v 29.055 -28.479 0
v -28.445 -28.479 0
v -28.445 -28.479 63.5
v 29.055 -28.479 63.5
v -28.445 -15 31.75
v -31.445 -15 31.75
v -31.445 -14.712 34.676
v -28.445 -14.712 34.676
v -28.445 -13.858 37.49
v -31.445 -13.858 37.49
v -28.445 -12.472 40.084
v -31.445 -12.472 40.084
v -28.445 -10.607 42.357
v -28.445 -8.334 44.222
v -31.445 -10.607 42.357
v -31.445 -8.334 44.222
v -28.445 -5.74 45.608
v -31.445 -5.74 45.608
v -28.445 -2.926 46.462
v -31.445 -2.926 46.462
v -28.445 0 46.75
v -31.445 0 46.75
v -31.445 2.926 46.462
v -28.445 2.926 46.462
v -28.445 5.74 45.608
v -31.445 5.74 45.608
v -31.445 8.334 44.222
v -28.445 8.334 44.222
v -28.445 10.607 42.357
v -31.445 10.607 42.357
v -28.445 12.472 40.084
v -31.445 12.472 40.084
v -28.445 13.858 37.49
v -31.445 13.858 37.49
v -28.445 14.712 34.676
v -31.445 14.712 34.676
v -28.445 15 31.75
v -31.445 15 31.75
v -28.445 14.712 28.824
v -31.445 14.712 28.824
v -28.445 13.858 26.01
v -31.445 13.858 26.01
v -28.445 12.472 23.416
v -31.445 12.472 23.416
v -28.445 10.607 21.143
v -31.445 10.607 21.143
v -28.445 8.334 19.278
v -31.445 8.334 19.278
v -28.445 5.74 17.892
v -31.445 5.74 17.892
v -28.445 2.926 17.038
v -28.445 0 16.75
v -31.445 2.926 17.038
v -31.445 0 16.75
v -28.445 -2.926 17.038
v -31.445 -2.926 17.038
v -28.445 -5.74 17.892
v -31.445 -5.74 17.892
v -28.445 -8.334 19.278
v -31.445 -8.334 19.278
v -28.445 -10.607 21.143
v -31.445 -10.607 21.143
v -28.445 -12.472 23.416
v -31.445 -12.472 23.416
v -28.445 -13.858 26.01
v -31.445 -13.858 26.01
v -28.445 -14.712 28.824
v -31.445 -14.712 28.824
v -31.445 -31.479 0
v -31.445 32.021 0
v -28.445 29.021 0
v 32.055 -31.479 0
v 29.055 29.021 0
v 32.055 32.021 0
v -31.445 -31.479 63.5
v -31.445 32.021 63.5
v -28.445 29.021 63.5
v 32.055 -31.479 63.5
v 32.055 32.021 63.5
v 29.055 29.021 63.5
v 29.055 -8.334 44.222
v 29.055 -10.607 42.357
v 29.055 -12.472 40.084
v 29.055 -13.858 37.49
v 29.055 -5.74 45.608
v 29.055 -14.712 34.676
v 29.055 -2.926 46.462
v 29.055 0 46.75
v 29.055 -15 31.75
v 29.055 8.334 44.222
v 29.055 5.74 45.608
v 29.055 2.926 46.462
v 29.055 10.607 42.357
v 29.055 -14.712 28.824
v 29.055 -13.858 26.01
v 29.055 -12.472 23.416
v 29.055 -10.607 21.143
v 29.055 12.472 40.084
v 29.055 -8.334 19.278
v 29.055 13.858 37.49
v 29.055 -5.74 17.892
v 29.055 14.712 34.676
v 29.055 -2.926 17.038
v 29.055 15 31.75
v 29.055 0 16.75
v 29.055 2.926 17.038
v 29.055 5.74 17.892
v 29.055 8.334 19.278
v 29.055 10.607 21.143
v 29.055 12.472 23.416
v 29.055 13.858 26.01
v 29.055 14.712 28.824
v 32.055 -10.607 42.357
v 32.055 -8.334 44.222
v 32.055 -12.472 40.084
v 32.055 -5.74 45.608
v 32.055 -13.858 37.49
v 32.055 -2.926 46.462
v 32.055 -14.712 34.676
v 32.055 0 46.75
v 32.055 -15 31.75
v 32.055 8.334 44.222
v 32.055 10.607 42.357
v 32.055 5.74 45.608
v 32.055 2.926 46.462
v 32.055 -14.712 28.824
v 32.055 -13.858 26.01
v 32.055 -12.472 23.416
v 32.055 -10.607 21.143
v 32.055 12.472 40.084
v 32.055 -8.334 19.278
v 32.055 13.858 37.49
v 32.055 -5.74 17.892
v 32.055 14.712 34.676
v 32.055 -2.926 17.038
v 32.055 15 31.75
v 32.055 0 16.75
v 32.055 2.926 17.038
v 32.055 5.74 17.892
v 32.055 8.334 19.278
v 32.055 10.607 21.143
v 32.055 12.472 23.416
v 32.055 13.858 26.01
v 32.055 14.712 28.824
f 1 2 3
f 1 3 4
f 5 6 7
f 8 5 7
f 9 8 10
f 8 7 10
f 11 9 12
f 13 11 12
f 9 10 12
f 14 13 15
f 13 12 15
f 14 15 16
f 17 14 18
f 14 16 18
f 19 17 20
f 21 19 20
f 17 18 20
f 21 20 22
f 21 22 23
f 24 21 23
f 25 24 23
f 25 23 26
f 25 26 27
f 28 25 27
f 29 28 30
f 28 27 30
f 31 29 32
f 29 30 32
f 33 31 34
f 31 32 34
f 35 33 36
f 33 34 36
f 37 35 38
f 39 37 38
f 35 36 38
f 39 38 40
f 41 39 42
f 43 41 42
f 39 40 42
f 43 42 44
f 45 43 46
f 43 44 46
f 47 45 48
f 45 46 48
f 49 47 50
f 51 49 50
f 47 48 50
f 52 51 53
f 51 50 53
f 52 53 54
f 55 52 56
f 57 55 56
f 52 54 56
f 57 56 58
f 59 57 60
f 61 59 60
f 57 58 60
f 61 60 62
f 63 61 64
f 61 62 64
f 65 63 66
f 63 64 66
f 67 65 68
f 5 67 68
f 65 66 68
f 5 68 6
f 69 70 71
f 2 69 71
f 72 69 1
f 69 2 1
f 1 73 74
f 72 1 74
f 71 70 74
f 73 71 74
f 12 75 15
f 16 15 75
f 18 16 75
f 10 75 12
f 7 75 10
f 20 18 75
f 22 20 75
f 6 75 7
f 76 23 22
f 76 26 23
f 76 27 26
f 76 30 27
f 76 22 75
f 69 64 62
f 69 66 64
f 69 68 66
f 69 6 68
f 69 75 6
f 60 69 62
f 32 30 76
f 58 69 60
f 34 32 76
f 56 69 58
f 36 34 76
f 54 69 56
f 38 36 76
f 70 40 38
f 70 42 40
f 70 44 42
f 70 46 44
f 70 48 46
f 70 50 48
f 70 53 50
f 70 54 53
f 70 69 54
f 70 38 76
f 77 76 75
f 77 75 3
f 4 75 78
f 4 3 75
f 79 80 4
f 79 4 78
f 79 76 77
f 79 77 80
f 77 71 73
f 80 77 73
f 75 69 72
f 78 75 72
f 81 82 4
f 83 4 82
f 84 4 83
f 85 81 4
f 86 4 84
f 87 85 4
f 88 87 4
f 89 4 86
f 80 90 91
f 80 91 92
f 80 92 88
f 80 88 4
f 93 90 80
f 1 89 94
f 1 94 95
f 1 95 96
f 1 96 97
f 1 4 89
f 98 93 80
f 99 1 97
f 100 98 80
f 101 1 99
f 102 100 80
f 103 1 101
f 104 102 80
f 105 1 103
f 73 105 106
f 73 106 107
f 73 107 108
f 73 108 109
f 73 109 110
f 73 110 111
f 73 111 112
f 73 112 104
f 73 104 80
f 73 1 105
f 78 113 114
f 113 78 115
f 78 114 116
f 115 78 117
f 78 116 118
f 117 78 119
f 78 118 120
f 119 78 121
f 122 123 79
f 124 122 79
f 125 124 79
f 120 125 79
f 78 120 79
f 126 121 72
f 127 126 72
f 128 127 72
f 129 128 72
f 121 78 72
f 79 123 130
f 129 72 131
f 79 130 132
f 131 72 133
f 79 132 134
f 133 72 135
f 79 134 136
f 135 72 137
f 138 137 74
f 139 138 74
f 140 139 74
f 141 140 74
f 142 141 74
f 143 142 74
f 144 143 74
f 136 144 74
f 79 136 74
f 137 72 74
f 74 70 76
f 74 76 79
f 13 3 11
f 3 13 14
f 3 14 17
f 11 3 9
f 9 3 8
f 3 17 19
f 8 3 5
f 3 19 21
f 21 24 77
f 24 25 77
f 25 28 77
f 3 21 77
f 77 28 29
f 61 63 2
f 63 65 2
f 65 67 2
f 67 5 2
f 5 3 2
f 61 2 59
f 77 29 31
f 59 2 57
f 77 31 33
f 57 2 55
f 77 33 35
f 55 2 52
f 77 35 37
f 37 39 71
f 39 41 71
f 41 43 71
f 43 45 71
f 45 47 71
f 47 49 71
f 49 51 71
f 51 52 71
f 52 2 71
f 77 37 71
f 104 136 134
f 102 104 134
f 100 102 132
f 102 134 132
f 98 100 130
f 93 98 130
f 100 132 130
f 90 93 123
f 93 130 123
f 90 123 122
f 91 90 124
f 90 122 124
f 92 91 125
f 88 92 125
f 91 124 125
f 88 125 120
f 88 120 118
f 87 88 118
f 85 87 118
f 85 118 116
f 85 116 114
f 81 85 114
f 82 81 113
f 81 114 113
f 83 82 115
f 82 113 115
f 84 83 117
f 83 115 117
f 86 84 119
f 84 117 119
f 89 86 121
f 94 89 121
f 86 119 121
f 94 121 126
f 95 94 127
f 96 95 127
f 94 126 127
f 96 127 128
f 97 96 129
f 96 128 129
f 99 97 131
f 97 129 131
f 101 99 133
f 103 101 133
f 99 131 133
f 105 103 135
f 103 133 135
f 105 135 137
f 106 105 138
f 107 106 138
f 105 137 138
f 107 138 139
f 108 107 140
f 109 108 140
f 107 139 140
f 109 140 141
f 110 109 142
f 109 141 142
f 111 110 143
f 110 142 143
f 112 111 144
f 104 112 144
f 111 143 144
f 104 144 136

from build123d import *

# Parameters (mm, degrees)
F0_W     = 63.5
F0_H     = 63.5
F0_W_2   = 57.5
F0_H_2   = 57.5
F1_DEPTH = 63.5
F2_R     = 15
F3_DEPTH = 3
F4_R     = 15
F5_DEPTH = 3


with BuildPart() as f1:
    # F0 (on Top) → F1 (new body)
    with BuildSketch(Plane.XY):
        with Locations((0.304607, 0.271222)):
            Rectangle(F0_W, F0_H)
        with Locations((0.304607, 0.271222)):
            Rectangle(F0_W_2, F0_H_2, mode=Mode.SUBTRACT)
    extrude(amount=F1_DEPTH)

    # F2 (on face) → F3 (cut)
    with BuildSketch(Plane.YZ.offset(32.054607)):
        with Locations((0, 31.75)):
            Circle(F2_R)
    extrude(amount=-F3_DEPTH, mode=Mode.SUBTRACT)

    # F4 (on face) → F5 (cut)
    with BuildSketch(Plane(origin=(-31.445393, 0, 0), x_dir=(0, -1, 0), z_dir=(-1, 0, 0))):
        with Locations((0, 31.75)):
            Circle(F4_R)
    extrude(amount=-F5_DEPTH, mode=Mode.SUBTRACT)


solid = f1.part
